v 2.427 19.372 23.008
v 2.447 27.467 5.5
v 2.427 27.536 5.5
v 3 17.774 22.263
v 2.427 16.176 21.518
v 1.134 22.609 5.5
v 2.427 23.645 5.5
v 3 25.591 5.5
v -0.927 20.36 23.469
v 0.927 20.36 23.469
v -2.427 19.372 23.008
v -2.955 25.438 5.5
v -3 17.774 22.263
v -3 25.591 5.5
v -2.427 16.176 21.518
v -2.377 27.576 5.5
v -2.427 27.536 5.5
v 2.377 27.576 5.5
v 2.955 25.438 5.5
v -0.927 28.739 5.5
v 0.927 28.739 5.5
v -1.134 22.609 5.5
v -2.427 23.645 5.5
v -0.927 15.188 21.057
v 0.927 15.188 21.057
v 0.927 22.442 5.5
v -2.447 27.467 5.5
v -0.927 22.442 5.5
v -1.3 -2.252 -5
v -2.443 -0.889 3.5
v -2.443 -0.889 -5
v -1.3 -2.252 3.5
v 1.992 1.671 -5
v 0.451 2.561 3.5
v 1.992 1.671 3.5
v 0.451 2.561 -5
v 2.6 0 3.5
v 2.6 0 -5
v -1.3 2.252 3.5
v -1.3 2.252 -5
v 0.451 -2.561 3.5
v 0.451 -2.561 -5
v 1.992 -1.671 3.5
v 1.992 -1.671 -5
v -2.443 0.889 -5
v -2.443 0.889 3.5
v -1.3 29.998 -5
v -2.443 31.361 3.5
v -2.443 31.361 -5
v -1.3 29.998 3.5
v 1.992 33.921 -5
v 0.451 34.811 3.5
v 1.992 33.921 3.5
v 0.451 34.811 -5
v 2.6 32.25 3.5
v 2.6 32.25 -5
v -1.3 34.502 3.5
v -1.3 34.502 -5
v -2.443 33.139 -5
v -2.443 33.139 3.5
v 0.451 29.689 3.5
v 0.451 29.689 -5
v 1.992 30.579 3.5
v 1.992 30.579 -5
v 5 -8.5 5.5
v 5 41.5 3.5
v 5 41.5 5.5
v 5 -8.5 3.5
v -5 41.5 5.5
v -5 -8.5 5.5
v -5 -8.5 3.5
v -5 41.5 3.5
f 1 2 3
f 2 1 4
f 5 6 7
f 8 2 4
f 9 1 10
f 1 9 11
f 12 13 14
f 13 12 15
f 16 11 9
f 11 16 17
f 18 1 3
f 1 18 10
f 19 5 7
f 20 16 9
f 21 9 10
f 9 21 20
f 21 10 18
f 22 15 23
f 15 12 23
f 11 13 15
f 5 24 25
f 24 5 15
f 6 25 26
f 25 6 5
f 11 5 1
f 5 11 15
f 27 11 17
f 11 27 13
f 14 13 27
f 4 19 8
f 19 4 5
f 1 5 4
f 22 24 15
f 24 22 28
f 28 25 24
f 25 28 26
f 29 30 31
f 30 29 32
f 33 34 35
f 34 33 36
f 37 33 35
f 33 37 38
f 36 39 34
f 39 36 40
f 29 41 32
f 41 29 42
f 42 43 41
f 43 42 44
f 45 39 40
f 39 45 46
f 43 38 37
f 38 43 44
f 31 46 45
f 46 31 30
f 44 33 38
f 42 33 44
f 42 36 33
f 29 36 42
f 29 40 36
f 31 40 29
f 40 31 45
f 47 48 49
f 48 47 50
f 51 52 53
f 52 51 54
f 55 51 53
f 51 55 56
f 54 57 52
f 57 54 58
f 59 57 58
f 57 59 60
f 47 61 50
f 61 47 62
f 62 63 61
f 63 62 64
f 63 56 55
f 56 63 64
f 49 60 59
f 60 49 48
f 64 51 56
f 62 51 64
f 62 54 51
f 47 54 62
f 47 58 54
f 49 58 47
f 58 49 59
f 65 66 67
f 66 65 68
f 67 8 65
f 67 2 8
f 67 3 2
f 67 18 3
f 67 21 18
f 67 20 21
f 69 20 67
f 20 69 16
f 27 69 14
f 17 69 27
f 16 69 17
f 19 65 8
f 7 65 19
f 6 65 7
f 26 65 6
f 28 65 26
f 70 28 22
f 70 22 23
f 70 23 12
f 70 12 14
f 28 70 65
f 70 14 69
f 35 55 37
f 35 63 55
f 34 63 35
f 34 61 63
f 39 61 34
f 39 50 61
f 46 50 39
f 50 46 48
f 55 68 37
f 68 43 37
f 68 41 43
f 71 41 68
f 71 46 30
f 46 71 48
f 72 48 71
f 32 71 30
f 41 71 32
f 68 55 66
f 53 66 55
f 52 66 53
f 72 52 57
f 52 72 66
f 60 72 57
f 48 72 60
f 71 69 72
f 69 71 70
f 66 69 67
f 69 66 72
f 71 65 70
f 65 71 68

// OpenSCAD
group() {
  cylinder(h = 10, r = 2.6, center = true);
  translate([0, 32.25, 0]) {
    cylinder(h = 10, r = 2.6, center = true);
  }
  translate([0, 16.5, 4.5]) {
    cube([10, 50, 2], center = true);
  }
  translate([0, 22, 13.2]) {
    difference() {
      color("red") {
        rotate([25, 0, 0]) {
          cylinder(h = 20, r = 3, center = true);
        }
      }
      translate([0,0,-10]) {
        color("blue") {
          cube([10, 50, 2], center = true);
        }
      }
    }
  }
}
